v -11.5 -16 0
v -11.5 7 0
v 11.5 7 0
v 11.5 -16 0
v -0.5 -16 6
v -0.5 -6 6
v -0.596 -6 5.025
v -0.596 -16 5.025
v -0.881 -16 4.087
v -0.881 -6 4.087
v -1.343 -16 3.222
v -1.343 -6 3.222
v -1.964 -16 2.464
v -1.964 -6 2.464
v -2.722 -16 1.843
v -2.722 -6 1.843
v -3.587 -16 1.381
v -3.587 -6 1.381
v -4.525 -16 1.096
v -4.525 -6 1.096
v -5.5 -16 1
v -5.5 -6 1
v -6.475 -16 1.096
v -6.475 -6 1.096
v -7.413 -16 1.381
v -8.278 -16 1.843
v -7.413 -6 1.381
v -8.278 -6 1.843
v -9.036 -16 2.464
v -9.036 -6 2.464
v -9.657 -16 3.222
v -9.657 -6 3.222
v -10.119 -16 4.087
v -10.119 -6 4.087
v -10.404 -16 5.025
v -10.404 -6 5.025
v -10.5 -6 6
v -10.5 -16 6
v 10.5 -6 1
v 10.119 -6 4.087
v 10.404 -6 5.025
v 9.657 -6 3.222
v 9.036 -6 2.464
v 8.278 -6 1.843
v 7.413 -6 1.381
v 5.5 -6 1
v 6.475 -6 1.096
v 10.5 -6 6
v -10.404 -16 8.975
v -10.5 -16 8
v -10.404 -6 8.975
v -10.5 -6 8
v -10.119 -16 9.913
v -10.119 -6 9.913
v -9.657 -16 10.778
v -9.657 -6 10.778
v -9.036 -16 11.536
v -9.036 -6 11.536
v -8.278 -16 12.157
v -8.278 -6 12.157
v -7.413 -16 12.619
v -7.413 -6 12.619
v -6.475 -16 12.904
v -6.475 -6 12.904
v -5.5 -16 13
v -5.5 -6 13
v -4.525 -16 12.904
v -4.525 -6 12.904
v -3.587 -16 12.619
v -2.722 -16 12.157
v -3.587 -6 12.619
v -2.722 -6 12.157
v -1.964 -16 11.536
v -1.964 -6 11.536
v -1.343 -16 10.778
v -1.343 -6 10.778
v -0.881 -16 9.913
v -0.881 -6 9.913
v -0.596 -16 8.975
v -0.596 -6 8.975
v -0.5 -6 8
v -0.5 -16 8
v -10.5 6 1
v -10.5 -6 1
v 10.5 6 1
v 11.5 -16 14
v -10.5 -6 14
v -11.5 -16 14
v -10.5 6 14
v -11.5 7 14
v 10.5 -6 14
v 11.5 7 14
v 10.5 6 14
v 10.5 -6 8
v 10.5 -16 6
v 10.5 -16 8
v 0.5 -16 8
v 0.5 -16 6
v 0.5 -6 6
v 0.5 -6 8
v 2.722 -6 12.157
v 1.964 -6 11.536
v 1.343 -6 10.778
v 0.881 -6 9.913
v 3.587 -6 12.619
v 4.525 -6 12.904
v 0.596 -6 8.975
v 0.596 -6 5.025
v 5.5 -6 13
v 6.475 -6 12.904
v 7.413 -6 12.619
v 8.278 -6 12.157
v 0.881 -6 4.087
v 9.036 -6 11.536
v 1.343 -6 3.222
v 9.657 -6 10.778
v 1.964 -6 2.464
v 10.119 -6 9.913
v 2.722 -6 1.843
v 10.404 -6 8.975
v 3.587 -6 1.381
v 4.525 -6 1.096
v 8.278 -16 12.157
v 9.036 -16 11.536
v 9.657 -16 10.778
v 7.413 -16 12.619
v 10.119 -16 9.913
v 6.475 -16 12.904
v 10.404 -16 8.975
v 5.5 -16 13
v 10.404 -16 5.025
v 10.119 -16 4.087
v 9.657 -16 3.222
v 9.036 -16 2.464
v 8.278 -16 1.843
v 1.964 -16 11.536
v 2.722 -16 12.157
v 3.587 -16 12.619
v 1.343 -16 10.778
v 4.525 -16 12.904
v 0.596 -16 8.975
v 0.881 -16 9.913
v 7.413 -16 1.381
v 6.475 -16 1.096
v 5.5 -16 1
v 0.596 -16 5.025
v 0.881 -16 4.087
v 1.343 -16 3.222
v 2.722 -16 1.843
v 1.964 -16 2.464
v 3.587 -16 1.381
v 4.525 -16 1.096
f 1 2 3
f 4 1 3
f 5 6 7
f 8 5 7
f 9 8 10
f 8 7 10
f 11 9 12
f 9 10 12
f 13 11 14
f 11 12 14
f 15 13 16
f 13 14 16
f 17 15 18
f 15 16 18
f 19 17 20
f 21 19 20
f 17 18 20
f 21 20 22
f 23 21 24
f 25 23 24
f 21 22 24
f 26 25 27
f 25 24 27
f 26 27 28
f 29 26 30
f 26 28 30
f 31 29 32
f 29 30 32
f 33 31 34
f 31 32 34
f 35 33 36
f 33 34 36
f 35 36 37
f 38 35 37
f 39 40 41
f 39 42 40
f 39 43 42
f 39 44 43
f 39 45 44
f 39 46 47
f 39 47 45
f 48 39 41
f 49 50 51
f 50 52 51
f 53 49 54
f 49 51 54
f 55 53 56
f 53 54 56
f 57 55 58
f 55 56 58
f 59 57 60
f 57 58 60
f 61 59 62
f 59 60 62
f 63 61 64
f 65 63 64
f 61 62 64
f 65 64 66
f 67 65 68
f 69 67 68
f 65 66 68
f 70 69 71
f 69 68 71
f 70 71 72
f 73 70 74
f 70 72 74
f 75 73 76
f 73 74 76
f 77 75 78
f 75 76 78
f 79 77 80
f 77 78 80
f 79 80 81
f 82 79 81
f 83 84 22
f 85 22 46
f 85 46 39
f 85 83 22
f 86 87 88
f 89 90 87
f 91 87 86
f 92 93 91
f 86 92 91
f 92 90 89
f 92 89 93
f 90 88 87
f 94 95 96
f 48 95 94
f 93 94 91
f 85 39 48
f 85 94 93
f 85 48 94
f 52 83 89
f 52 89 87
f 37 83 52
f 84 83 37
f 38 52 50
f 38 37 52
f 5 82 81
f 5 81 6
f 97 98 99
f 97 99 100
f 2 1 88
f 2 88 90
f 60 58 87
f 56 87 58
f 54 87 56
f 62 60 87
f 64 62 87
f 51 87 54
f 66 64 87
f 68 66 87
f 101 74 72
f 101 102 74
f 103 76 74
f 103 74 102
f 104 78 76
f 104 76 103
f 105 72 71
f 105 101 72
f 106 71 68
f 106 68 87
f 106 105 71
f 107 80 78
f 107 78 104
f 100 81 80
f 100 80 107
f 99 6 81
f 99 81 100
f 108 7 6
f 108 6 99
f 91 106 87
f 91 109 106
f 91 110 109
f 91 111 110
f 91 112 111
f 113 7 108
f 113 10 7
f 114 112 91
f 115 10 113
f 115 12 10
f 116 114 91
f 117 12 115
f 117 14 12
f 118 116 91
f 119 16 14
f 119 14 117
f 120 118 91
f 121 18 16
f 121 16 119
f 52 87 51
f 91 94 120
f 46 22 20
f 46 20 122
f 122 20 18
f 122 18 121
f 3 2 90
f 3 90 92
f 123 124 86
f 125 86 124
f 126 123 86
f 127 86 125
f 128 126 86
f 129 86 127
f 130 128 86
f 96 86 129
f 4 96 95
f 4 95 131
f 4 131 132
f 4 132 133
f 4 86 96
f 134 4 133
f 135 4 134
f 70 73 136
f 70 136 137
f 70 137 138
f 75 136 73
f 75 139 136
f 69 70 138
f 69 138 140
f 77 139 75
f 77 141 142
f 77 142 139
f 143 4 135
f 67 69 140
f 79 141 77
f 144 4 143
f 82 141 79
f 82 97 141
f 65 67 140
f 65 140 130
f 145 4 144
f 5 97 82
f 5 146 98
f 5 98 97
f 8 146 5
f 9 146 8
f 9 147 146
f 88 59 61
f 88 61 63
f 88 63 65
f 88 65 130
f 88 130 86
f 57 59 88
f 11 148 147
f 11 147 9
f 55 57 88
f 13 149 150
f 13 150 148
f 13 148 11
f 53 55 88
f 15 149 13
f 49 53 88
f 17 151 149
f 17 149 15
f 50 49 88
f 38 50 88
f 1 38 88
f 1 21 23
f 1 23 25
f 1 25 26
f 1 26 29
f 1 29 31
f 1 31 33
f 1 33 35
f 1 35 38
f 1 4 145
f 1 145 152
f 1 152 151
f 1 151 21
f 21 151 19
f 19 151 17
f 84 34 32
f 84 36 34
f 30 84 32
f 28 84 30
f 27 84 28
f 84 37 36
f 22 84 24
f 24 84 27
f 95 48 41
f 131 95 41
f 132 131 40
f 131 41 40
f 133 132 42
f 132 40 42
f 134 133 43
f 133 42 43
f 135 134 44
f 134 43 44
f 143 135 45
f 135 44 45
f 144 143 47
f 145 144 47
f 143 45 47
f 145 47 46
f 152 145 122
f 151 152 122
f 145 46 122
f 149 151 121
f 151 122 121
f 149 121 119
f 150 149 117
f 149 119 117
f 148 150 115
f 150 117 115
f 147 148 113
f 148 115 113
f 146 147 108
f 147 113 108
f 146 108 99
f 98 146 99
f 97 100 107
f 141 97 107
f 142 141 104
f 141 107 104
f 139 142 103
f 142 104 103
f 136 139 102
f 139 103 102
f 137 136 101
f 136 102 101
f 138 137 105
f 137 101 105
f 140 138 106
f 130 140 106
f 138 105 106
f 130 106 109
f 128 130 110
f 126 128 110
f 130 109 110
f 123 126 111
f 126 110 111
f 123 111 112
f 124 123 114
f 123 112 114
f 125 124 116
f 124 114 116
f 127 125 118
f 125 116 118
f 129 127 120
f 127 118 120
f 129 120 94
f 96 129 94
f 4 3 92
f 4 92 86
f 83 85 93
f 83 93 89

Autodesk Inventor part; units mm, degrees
ref_plane "YZ Plane" through (0, 0, 0) normal (1, 0, 0) x (0, 1, 0)
ref_plane "XZ Plane" through (0, 0, 0) normal (0, 1, 0) x (-1, 0, 0)
ref_plane "XY Plane" through (0, 0, 0) normal (0, 0, 1) x (1, 0, 0)
sketch "Base Sketch" plane through (0, 0, 0) normal (0, 0, 1) x (1, 0, 0)
  line L0 (-10.5, -6) -> (10.5, -6)
  line L1 (10.5, -6) -> (10.5, 6)
  line L2 (10.5, 6) -> (-10.5, 6)
  line L3 (-10.5, 6) -> (-10.5, -6)
  line L4 (-10.5, -6) -> (10.5, 6) construction
  line L5 (10.5, -6) -> (-10.5, 6) construction
  line L6 (-11.5, 7) -> (11.5, 7)
  line L7 (11.5, 7) -> (11.5, -16)
  line L8 (11.5, -16) -> (-11.5, -16)
  line L9 (-11.5, -16) -> (-11.5, 7)
  point P0 (0, 0)
  dimension "CavityWidth" = 21
  dimension "CavityHeight" = 12
  dimension "d5" = 1
  dimension "d6" = 1
  dimension "d7" = 1
  dimension "d8" = 10
extrude "Walls" add sketch "Base Sketch" along normal blind 14
extrude "Back" add sketch "Base Sketch" along normal blind 1 contours L3 L2 L1 L0
sketch "Whistle Hole Sketch" plane through (-10.5, -6, 14) normal (0, 1, 0) x (1, 0, 0)
  line L0 (21, 13) -> (0, 13) construction
  line L1 (0, 13) -> (0, 0) construction
  line L2 (21, 0) -> (0, 0) construction
  line L3 (21, 13) -> (21, 0) construction
  line L4 (5, 6) -> (5, 8) construction
  line L5 (10, 6) -> (10, 8)
  line L6 (0, 8) -> (0, 6)
  arc A0 (0, 6) -> (10, 6) centre (5, 6) ccw
  arc A1 (10, 8) -> (0, 8) centre (5, 8) ccw
  point P0 (10.5, 14)
  point P1 (5, 7)
  dimension "d11" = 2
  dimension "d12" = 10
extrude "Whistle Hole" cut sketch "Whistle Hole Sketch" against normal up to surface (10 mm away)
pattern_linear "Rectangular Pattern2" count 2 spacing 11 along (1, 0, 0) of "Whistle Hole"
equation "\"d5\" = WallThickness"
equation "\"d6\" = WallThickness"
equation "\"d7\" = WallThickness"
equation "\"d8\" = CapLength"
equation "\"d3\" = MaxWidth + CapOvalLength + 2 * WallThickness"
equation "\"d9\" = WallThickness"
equation "\"d20\" = WallThickness"
equation "\"d30\" = MaxWidth + SpaceBtwnKeys"
equation "\"SpaceBtwnKeys\" = 1"
equation "\"WallThickness\" = 1"
equation "\"CapLength\" = 10"
equation "\"MaxWidth\" = 10"
equation "\"CapOvalLength\" = 2"
properties part number "Manifold0"
